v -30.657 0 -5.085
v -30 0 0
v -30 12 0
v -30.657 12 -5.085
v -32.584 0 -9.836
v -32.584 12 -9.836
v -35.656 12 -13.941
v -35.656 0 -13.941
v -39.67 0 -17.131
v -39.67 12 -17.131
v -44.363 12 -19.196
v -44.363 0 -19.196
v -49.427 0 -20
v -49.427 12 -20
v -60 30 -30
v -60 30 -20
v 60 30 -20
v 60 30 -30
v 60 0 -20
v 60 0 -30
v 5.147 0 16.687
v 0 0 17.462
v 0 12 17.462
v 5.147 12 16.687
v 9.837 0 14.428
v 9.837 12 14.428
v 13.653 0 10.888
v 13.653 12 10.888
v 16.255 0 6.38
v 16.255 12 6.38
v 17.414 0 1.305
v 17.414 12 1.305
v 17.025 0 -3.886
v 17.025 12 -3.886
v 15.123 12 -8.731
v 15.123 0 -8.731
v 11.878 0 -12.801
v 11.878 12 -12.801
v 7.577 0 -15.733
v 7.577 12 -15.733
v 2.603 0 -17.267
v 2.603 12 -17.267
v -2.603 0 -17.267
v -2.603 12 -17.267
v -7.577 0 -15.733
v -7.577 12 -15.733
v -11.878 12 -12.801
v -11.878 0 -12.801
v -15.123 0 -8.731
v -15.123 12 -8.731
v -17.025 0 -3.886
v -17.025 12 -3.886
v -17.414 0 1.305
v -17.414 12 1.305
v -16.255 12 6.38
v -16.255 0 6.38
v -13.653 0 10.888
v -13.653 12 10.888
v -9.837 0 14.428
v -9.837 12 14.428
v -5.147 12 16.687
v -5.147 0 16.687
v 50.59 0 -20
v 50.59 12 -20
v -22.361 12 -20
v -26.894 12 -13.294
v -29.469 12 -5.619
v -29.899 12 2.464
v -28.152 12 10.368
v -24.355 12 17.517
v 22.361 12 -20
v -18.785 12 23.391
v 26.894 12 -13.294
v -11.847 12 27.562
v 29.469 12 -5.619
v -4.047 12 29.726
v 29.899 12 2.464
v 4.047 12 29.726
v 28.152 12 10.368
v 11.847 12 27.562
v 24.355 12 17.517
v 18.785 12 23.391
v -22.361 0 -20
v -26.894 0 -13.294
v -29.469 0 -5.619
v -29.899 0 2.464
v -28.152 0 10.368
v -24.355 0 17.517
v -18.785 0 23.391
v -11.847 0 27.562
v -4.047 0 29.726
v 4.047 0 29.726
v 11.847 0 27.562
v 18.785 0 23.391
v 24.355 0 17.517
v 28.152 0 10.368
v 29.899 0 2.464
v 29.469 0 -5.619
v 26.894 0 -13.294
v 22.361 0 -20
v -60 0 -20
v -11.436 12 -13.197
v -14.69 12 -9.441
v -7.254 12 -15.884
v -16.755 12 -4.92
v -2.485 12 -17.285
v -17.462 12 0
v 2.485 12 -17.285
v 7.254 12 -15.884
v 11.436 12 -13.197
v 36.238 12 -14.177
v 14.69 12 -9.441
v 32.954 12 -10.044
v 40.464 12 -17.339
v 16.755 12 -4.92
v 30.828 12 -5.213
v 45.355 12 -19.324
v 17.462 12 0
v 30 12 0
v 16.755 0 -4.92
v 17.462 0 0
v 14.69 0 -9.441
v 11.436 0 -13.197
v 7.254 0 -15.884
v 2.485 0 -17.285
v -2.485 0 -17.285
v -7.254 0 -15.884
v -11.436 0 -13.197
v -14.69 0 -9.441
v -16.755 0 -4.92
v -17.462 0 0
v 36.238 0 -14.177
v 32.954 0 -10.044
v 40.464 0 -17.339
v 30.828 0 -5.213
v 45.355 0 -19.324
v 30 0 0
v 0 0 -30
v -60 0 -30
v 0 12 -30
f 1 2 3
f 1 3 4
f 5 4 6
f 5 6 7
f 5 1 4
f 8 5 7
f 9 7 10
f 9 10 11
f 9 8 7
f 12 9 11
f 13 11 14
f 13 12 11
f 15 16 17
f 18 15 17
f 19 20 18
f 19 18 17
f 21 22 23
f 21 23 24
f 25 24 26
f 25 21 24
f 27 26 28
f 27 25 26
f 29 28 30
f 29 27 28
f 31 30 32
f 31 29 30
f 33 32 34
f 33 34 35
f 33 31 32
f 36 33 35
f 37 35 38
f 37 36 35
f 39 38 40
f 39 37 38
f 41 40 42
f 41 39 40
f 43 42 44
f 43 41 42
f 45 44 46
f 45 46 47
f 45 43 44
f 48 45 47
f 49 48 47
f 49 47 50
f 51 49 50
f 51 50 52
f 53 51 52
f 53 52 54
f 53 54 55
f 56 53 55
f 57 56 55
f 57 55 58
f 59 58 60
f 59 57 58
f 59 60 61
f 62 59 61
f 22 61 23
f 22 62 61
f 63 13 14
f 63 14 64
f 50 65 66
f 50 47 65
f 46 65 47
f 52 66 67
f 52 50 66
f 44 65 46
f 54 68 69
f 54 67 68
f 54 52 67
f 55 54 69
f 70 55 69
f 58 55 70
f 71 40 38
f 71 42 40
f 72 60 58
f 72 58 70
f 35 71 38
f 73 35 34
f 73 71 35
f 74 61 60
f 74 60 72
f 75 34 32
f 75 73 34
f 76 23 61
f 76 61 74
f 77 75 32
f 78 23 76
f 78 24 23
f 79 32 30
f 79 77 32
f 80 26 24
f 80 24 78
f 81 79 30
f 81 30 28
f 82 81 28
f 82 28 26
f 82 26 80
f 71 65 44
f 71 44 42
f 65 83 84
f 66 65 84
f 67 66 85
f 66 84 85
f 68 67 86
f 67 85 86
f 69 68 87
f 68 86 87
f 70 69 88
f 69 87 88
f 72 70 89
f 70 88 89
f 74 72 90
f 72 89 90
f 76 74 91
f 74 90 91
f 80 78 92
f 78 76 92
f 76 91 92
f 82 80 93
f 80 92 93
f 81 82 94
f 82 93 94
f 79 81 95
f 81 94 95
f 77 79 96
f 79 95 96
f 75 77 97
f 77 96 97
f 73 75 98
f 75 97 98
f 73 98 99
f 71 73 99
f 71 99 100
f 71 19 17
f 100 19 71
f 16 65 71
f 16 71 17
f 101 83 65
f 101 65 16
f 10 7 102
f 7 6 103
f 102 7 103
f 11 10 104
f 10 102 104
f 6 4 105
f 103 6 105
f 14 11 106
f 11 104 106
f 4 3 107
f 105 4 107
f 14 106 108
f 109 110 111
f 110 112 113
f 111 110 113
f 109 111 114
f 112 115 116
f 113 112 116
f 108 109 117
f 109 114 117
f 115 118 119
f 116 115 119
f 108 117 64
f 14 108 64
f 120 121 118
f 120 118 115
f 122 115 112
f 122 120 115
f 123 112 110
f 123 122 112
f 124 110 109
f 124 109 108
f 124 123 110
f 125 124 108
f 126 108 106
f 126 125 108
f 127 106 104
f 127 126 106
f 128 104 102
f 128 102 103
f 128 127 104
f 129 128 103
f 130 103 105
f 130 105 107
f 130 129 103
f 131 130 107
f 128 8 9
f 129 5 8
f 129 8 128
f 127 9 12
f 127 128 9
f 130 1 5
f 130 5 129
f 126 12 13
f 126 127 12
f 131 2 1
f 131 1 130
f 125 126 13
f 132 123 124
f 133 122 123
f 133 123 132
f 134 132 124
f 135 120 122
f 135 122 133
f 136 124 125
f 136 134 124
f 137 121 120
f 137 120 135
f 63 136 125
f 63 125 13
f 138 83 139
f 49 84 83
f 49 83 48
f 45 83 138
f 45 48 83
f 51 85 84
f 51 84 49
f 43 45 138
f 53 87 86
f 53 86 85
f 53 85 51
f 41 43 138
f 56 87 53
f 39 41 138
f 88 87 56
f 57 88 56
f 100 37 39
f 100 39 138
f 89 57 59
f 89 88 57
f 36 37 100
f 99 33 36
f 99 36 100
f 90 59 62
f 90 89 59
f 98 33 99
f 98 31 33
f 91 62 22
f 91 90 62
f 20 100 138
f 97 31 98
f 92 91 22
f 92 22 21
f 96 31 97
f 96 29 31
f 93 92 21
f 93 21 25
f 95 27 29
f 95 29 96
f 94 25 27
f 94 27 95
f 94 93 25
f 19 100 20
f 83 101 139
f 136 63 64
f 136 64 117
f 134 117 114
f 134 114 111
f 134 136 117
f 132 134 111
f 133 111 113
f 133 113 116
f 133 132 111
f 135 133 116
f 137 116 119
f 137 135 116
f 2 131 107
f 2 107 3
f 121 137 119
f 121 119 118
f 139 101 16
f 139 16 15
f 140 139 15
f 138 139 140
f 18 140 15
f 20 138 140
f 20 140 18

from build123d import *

# Parameters (mm, degrees)
SKETCH1_R           = 30
SKETCH1_R_2         = 17.4625
BOSS_EXTRUDE1_DEPTH = 12
BOSS_EXTRUDE2_DEPTH = 30
BOSS_EXTRUDE3_DEPTH = 12


with BuildPart() as part:
    # Sketch1 → Boss-Extrude1 (new body)
    with BuildSketch(Plane(origin=(0, 0, 0), x_dir=(1, 0, 0), z_dir=(0, 1, 0))):
        with Locations(Location((0, 0, 0), (0, 0, 270))):
            Circle(SKETCH1_R)
        with Locations(Location((0, 0, 0), (0, 0, 270))):
            Circle(SKETCH1_R_2, mode=Mode.SUBTRACT)
    extrude(amount=BOSS_EXTRUDE1_DEPTH)

    # Sketch5 → Boss-Extrude2 (add)
    with BuildSketch(Plane.XZ):
        Polygon((0, -30), (60, -30), (60, -20), (0, -20), (-60, -20), (-60, -30), align=None)
    extrude(amount=-BOSS_EXTRUDE2_DEPTH)


with BuildPart() as body_2:
    # Sketch6 → Boss-Extrude3 (new body)
    with BuildSketch(Plane.XZ):
        with BuildLine():
            ThreePointArc((-30, 0), (-28.025170769, -10.704662693), (-22.360679775, -20))
            Line((-22.360679775, -20), (22.360679775, -20))
            ThreePointArc((22.360679775, -20), (28.025170769, -10.704662693), (30, 0))
            Line((30, 0), (17.4625, 0))
            ThreePointArc((17.4625, 0), (0, -17.4625), (-17.4625, 0))
            Line((-17.4625, 0), (-30, 0))
        make_face()
        with BuildLine():
            ThreePointArc((30, 0), (28.025170769, -10.704662693), (22.360679775, -20))
            Line((22.360679775, -20), (50.590169944, -20))
            ThreePointArc((50.590169944, -20), (36.237860911, -14.176946646), (30, 0))
        make_face()
        with BuildLine():
            Line((-49.426745923, -20), (-22.360679775, -20))
            ThreePointArc((-22.360679775, -20), (-28.025170769, -10.704662693), (-30, 0))
            ThreePointArc((-30, 0), (-35.6561489, -13.940933049), (-49.426745923, -20))
        make_face()
    extrude(amount=-BOSS_EXTRUDE3_DEPTH)


solid = Compound([part.part, body_2.part])
